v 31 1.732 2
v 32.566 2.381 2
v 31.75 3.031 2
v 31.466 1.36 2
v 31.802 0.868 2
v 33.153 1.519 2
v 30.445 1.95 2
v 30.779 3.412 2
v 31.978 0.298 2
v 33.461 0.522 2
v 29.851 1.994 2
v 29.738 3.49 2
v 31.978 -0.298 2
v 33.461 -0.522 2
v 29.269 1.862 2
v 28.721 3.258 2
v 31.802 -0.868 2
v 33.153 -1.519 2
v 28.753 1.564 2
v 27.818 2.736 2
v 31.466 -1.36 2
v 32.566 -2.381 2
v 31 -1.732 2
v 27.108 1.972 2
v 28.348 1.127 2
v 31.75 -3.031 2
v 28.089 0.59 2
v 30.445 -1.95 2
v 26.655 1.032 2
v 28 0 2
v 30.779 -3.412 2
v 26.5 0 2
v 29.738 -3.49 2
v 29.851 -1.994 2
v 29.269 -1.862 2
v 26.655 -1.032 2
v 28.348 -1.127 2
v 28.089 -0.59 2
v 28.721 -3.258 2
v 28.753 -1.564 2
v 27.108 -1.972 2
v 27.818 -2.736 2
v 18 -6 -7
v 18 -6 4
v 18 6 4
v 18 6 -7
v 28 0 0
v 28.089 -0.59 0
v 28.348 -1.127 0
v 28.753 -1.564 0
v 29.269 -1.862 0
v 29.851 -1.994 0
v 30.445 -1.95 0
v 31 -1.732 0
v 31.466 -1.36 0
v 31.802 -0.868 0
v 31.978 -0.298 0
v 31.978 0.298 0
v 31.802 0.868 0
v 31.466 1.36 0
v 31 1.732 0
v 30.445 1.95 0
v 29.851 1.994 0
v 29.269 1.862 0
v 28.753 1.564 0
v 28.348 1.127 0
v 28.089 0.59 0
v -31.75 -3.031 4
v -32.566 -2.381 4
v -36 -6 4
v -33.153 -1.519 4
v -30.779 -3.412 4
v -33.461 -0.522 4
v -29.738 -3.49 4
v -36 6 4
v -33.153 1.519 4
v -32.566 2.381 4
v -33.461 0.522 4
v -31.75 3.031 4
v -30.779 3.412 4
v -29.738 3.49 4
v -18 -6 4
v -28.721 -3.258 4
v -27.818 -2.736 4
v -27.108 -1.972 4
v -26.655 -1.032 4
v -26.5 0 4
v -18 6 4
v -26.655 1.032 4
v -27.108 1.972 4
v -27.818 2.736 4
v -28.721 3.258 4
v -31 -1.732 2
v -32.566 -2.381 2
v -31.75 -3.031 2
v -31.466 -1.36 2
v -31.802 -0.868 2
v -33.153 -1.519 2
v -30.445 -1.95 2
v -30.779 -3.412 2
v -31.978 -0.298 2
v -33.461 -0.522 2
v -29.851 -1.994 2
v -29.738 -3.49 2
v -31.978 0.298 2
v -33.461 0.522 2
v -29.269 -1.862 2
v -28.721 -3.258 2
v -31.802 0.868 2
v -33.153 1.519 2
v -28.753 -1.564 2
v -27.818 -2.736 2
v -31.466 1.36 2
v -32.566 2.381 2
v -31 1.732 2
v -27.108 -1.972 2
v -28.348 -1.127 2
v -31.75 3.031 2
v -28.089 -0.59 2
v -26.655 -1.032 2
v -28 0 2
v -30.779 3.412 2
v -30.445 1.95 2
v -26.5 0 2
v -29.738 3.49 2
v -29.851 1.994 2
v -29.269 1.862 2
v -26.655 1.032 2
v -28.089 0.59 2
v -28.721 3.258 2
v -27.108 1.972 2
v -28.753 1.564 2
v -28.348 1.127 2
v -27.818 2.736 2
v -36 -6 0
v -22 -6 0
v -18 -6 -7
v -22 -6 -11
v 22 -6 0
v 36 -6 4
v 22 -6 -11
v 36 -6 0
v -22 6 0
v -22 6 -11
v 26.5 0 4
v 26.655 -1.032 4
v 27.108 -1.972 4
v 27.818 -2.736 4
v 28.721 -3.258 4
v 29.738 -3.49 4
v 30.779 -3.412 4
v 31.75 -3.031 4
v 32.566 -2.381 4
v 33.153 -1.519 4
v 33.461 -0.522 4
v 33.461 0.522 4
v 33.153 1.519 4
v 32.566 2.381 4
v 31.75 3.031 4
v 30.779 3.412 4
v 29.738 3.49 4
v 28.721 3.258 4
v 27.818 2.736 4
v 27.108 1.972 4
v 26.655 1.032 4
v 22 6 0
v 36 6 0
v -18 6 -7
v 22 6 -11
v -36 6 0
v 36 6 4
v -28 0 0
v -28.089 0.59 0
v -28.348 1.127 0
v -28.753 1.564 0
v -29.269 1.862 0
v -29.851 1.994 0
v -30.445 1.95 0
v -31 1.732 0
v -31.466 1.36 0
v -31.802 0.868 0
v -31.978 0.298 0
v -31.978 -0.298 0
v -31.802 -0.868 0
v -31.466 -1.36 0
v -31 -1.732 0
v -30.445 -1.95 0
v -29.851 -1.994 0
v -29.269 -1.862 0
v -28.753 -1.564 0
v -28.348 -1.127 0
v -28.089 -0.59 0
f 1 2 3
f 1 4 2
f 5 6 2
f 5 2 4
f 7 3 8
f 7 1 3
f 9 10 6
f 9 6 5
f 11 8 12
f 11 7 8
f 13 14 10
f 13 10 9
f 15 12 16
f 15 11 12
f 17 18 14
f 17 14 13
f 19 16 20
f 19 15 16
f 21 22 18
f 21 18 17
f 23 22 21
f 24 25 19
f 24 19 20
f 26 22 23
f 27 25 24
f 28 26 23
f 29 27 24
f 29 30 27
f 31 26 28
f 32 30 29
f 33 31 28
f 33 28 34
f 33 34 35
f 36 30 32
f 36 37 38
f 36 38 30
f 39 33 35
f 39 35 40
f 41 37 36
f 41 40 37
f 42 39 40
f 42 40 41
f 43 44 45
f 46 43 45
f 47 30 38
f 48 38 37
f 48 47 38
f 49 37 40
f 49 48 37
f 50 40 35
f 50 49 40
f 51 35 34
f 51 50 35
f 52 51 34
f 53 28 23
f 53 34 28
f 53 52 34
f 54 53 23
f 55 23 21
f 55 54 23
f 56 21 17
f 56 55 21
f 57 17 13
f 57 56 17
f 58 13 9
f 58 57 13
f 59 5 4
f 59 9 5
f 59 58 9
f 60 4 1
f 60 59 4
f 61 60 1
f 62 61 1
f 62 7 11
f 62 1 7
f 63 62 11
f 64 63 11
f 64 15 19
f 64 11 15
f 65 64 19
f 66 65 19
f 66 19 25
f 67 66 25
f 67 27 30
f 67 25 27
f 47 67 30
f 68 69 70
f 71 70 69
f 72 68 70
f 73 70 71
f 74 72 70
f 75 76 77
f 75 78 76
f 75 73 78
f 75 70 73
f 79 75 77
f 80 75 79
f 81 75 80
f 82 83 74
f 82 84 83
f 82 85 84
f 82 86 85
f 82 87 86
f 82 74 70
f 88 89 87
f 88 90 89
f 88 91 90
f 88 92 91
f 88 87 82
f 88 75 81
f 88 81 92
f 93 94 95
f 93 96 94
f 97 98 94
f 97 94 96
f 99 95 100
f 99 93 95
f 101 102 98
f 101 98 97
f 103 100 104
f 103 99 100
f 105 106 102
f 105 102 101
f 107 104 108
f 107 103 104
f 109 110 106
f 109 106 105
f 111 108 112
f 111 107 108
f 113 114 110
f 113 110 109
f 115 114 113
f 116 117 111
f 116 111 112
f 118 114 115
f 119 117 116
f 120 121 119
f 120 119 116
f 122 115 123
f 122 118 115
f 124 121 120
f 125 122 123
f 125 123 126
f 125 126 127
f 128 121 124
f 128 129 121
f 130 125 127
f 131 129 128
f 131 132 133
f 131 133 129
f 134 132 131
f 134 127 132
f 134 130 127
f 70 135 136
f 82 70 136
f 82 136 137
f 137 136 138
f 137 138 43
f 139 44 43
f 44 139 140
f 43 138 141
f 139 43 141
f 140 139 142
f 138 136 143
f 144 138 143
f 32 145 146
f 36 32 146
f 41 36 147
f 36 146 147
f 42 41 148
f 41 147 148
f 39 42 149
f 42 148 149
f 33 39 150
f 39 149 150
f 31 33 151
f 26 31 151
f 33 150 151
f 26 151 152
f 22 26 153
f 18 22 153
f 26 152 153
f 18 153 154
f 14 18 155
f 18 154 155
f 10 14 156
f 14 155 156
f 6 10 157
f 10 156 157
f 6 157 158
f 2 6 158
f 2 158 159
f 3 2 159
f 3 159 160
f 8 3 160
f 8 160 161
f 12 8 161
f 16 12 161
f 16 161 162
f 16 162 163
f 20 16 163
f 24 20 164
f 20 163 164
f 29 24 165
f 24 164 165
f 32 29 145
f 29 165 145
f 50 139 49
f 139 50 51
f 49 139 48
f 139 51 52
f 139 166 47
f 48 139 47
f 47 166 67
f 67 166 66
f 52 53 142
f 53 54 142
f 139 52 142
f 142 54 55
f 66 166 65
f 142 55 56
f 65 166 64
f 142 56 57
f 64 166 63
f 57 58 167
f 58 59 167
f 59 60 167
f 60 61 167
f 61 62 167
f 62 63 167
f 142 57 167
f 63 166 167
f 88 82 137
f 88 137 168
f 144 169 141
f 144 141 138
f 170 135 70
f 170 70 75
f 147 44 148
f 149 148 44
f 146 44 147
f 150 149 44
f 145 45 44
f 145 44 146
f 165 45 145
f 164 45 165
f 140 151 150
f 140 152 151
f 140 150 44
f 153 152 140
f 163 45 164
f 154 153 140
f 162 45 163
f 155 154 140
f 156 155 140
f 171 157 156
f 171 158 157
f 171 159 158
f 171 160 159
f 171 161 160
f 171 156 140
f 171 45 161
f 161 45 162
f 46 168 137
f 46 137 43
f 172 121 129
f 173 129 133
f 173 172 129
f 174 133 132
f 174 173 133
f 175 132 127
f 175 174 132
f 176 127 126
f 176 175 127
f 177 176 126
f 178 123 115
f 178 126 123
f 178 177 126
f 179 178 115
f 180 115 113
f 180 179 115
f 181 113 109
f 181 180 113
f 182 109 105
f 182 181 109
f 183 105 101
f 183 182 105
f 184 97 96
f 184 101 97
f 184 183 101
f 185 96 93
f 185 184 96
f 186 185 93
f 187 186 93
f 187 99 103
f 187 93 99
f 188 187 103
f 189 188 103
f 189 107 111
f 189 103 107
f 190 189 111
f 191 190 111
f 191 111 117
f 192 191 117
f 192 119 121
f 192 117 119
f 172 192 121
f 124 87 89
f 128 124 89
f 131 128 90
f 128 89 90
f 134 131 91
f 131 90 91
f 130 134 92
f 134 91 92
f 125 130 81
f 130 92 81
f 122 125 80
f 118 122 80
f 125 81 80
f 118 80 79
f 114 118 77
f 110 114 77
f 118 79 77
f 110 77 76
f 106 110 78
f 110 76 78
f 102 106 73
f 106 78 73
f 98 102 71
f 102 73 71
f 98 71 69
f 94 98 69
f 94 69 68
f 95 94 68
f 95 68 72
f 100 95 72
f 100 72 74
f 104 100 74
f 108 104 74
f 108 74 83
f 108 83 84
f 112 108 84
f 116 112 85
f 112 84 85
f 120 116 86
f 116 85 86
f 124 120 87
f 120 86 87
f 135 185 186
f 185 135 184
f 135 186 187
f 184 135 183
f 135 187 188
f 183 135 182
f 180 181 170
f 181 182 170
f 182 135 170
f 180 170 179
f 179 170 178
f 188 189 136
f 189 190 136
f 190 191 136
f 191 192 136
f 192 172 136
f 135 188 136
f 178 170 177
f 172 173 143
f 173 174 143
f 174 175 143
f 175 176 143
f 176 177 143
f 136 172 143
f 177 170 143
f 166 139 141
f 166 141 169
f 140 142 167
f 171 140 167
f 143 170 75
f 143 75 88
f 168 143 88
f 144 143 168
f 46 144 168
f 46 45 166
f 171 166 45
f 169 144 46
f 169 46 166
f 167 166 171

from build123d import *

# Parameters (mm, degrees)
SKICA1_W                 = 72
SKICA1_H                 = 12
SKICA1_R                 = 2
P_IDAT_VYSUNUT_M1_DEPTH  = 4
SKICA2_R                 = 3.5
ODEBRAT_VYSUNUT_M1_DEPTH = 2
SKICA3_W                 = 44
SKICA3_H                 = 12
P_IDAT_VYSUNUT_M2_DEPTH  = 11
SKICA4_W                 = 36
SKICA4_H                 = 12
ODEBRAT_VYSUNUT_M2_DEPTH = 11


with BuildPart() as part:
    # Skica1 → Přidat vysunutím1 (new body)
    with BuildSketch(Plane.XY):
        Rectangle(SKICA1_W, SKICA1_H)
        with Locations((-30, 0)):
            Circle(SKICA1_R, mode=Mode.SUBTRACT)
        with Locations(Location((30, 0, 0), (0, 0, 180))):
            Circle(SKICA1_R, mode=Mode.SUBTRACT)
    extrude(amount=P_IDAT_VYSUNUT_M1_DEPTH)

    # Skica2 → Odebrat vysunutím1 (cut)
    with BuildSketch(Plane.XY.offset(4)):
        with Locations((-30, 0)):
            Circle(SKICA2_R)
        with Locations(Location((30, 0, 0), (0, 0, 180))):
            Circle(SKICA2_R)
    extrude(amount=-ODEBRAT_VYSUNUT_M1_DEPTH, mode=Mode.SUBTRACT)

    # Skica3 → Přidat vysunutím2 (add)
    with BuildSketch(Plane(origin=(0, 0, 0), x_dir=(-1, 0, 0), z_dir=(0, 0, -1))):
        Rectangle(SKICA3_W, SKICA3_H)
    extrude(amount=P_IDAT_VYSUNUT_M2_DEPTH)

    # Skica4 → Odebrat vysunutím2 (cut)
    with BuildSketch(Plane.XY.offset(4)):
        Rectangle(SKICA4_W, SKICA4_H)
    extrude(amount=-ODEBRAT_VYSUNUT_M2_DEPTH, mode=Mode.SUBTRACT)


solid = part.part
